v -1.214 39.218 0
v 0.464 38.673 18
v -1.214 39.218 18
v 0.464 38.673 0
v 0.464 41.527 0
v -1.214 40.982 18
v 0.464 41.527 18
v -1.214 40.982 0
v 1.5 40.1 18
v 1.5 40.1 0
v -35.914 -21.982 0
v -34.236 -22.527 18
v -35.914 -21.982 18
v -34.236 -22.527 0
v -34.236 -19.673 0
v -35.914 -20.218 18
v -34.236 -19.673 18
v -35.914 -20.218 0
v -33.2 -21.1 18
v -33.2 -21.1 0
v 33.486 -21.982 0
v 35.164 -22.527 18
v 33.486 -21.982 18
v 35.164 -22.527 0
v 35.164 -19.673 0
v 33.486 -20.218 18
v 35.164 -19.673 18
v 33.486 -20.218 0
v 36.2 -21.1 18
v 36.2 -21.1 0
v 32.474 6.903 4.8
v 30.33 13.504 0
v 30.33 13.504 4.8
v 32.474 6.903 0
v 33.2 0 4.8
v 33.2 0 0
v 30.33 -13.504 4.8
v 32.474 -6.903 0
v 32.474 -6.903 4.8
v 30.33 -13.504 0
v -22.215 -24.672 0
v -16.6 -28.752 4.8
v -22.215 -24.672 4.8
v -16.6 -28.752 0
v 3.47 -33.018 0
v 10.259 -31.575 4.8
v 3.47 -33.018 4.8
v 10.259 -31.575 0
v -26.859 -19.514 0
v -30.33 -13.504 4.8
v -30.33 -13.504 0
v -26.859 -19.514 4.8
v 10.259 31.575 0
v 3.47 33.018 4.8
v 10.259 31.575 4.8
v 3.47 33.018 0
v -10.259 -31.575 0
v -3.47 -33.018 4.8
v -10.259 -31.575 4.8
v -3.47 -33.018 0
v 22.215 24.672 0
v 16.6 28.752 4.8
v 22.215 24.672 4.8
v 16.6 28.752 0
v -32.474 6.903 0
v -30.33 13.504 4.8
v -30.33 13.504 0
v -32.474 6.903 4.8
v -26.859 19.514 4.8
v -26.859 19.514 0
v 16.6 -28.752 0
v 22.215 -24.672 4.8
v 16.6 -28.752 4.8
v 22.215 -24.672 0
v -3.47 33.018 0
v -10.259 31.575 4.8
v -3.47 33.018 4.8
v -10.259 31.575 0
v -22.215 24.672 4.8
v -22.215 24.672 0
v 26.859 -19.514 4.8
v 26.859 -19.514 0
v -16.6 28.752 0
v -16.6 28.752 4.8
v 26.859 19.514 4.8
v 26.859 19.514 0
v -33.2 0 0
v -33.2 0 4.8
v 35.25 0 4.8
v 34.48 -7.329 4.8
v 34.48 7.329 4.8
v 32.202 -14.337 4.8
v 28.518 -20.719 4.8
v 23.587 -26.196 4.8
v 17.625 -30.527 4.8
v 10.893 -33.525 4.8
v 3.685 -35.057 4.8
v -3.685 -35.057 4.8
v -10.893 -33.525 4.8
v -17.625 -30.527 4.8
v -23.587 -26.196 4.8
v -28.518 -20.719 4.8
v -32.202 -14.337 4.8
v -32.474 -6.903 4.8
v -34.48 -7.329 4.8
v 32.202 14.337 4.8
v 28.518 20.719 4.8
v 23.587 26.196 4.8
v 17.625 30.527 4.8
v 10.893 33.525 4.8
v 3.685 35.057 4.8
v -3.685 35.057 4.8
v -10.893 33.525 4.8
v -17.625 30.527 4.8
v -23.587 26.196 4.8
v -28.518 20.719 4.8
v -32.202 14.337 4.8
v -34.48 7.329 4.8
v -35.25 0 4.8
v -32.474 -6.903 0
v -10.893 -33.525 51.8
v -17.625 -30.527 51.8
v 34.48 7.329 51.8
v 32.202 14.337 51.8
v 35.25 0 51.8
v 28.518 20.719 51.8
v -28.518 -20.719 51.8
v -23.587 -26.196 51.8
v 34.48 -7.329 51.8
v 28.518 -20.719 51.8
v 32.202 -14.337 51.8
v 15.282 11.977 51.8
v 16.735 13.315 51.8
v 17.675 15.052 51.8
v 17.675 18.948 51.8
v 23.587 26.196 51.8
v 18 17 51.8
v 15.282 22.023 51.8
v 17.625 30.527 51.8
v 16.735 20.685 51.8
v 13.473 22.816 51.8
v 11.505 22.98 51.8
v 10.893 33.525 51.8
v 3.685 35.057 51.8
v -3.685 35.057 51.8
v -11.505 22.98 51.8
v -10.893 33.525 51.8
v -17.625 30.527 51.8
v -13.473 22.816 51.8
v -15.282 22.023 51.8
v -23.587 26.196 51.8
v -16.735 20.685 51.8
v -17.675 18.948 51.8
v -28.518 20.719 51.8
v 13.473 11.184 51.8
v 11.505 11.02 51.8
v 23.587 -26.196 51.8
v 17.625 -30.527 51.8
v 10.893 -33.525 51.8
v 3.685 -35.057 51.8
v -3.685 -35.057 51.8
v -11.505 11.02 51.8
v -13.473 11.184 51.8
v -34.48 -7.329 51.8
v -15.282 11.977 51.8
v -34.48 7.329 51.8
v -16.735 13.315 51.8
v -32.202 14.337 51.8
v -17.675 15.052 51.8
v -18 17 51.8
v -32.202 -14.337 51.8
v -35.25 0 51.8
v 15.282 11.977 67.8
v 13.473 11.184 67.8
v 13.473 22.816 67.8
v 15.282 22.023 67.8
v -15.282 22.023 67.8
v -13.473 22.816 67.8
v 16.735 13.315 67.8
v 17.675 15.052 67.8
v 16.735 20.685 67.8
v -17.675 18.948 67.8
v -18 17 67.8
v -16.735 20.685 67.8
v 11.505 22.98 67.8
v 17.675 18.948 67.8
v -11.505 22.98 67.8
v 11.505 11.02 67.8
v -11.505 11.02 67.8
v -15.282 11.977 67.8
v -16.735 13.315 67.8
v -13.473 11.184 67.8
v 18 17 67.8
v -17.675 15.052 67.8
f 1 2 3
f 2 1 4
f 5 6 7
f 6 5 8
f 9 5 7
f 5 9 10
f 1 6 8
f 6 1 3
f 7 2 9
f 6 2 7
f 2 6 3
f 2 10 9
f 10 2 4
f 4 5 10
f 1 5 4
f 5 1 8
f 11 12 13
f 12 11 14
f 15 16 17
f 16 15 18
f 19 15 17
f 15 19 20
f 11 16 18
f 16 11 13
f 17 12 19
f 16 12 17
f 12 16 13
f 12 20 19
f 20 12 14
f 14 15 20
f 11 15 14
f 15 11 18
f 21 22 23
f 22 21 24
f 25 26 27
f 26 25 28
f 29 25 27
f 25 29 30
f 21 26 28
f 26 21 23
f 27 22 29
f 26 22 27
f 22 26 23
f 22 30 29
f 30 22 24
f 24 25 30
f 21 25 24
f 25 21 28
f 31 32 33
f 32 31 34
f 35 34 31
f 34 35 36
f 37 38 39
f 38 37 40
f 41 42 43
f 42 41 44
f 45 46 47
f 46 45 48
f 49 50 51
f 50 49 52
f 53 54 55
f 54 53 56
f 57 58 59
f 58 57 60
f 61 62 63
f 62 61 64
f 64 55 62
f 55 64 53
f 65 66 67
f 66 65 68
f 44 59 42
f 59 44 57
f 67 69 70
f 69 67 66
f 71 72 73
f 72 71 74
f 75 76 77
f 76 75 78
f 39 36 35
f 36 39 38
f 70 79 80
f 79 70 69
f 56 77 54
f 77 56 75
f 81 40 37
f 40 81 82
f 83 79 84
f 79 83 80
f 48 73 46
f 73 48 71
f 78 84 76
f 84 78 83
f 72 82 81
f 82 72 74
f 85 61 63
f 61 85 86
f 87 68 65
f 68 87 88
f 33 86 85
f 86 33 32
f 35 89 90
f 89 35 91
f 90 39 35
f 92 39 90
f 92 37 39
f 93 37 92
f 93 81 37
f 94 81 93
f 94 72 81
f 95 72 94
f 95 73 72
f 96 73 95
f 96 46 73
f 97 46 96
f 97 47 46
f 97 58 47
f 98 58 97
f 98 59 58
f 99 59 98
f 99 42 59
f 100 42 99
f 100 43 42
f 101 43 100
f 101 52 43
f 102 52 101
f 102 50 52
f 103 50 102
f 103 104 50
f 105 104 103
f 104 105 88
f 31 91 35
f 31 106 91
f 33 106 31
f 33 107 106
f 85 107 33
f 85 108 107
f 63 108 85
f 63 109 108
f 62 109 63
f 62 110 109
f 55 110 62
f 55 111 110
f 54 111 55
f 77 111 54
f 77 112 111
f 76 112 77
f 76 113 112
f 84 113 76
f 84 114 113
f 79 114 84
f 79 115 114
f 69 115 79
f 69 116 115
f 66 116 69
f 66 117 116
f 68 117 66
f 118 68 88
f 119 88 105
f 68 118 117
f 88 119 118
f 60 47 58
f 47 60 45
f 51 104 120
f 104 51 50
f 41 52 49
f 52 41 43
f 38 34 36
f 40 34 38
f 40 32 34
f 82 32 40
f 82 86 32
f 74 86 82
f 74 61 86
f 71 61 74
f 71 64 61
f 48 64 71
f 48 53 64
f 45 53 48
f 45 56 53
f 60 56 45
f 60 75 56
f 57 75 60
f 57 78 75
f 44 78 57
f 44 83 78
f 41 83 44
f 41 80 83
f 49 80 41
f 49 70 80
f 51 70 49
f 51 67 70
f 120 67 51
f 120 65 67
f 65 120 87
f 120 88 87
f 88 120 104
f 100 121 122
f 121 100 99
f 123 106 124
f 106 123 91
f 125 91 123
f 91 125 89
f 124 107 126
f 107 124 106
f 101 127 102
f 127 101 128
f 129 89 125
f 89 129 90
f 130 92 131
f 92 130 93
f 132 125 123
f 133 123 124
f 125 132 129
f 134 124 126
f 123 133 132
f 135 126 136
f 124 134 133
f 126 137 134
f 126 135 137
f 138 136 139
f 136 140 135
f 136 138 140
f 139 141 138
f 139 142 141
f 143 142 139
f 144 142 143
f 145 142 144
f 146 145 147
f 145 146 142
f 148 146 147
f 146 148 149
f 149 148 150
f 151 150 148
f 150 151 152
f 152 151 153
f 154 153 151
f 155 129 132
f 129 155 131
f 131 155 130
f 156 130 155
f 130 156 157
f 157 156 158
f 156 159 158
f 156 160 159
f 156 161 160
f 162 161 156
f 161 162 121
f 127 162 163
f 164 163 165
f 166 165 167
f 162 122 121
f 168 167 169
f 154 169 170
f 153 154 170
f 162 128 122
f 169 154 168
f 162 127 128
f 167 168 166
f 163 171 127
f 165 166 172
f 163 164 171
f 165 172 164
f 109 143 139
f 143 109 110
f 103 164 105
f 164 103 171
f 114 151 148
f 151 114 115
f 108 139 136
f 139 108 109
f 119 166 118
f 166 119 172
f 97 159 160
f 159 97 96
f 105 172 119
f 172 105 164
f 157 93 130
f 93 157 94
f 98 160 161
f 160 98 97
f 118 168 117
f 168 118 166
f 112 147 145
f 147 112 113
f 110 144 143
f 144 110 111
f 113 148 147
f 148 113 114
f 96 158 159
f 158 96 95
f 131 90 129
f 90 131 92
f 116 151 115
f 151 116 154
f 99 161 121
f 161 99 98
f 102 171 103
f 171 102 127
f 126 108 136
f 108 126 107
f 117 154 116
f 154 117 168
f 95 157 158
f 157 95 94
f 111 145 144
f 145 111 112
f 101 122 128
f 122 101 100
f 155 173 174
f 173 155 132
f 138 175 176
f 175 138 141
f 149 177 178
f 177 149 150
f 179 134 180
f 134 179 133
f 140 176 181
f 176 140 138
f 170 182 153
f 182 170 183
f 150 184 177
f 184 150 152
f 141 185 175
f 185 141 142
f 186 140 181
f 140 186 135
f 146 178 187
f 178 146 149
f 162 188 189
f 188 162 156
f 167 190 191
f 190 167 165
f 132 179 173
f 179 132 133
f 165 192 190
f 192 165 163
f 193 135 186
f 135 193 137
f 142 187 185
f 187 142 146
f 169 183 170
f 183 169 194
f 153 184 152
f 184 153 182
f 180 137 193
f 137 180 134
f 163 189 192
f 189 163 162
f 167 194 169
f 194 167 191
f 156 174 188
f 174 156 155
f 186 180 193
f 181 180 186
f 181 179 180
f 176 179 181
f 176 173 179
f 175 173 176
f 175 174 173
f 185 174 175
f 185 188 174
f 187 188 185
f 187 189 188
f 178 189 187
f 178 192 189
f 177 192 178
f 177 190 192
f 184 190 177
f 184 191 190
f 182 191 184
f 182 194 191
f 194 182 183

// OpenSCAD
//DH-52 Variant (the tiny one)
MeterGauge();
rimDiameter = 66.4;
rimHeight = 4.8;
bodyDiameter = 70.5;
bodyHeight = 47;

module MeterGauge() {
    union() {
        // Outer Rim
        cylinder(h = rimHeight, d = rimDiameter);
        
        // Body
        translate([0, 0, rimHeight]) {
            cylinder(h = bodyHeight, d = bodyDiameter);
        }
        
        // Terminals
        hull() {
            hull() {
                terminal();
                mirror([1,0,0]) terminal();
            }
            /*
            translate ([0, -70, 0]) {
                hull() {
                    terminal();
                    mirror([1,0,0]) terminal();
                }
            }
            */
        }
        
        // Screw holes
        translate([0, 40.1, 0]) {
            m3screw();
            translate([-69.4/2, -61.2]) {
                m3screw();
            }
            translate([69.4/2, -61.2]) {
                m3screw();
            }
        }
    }
}

module terminal() {
    translate([12, 17, rimHeight + bodyHeight]) {
        terminalHeight = 16;
        terminalDiameter = 12;
        cylinder(h = terminalHeight, d = terminalDiameter);
    }
}

module m3screw () {
    screwHeight = 18;
    screwDiameter = 3;
    cylinder(h= screwHeight, d = screwDiameter);
}
